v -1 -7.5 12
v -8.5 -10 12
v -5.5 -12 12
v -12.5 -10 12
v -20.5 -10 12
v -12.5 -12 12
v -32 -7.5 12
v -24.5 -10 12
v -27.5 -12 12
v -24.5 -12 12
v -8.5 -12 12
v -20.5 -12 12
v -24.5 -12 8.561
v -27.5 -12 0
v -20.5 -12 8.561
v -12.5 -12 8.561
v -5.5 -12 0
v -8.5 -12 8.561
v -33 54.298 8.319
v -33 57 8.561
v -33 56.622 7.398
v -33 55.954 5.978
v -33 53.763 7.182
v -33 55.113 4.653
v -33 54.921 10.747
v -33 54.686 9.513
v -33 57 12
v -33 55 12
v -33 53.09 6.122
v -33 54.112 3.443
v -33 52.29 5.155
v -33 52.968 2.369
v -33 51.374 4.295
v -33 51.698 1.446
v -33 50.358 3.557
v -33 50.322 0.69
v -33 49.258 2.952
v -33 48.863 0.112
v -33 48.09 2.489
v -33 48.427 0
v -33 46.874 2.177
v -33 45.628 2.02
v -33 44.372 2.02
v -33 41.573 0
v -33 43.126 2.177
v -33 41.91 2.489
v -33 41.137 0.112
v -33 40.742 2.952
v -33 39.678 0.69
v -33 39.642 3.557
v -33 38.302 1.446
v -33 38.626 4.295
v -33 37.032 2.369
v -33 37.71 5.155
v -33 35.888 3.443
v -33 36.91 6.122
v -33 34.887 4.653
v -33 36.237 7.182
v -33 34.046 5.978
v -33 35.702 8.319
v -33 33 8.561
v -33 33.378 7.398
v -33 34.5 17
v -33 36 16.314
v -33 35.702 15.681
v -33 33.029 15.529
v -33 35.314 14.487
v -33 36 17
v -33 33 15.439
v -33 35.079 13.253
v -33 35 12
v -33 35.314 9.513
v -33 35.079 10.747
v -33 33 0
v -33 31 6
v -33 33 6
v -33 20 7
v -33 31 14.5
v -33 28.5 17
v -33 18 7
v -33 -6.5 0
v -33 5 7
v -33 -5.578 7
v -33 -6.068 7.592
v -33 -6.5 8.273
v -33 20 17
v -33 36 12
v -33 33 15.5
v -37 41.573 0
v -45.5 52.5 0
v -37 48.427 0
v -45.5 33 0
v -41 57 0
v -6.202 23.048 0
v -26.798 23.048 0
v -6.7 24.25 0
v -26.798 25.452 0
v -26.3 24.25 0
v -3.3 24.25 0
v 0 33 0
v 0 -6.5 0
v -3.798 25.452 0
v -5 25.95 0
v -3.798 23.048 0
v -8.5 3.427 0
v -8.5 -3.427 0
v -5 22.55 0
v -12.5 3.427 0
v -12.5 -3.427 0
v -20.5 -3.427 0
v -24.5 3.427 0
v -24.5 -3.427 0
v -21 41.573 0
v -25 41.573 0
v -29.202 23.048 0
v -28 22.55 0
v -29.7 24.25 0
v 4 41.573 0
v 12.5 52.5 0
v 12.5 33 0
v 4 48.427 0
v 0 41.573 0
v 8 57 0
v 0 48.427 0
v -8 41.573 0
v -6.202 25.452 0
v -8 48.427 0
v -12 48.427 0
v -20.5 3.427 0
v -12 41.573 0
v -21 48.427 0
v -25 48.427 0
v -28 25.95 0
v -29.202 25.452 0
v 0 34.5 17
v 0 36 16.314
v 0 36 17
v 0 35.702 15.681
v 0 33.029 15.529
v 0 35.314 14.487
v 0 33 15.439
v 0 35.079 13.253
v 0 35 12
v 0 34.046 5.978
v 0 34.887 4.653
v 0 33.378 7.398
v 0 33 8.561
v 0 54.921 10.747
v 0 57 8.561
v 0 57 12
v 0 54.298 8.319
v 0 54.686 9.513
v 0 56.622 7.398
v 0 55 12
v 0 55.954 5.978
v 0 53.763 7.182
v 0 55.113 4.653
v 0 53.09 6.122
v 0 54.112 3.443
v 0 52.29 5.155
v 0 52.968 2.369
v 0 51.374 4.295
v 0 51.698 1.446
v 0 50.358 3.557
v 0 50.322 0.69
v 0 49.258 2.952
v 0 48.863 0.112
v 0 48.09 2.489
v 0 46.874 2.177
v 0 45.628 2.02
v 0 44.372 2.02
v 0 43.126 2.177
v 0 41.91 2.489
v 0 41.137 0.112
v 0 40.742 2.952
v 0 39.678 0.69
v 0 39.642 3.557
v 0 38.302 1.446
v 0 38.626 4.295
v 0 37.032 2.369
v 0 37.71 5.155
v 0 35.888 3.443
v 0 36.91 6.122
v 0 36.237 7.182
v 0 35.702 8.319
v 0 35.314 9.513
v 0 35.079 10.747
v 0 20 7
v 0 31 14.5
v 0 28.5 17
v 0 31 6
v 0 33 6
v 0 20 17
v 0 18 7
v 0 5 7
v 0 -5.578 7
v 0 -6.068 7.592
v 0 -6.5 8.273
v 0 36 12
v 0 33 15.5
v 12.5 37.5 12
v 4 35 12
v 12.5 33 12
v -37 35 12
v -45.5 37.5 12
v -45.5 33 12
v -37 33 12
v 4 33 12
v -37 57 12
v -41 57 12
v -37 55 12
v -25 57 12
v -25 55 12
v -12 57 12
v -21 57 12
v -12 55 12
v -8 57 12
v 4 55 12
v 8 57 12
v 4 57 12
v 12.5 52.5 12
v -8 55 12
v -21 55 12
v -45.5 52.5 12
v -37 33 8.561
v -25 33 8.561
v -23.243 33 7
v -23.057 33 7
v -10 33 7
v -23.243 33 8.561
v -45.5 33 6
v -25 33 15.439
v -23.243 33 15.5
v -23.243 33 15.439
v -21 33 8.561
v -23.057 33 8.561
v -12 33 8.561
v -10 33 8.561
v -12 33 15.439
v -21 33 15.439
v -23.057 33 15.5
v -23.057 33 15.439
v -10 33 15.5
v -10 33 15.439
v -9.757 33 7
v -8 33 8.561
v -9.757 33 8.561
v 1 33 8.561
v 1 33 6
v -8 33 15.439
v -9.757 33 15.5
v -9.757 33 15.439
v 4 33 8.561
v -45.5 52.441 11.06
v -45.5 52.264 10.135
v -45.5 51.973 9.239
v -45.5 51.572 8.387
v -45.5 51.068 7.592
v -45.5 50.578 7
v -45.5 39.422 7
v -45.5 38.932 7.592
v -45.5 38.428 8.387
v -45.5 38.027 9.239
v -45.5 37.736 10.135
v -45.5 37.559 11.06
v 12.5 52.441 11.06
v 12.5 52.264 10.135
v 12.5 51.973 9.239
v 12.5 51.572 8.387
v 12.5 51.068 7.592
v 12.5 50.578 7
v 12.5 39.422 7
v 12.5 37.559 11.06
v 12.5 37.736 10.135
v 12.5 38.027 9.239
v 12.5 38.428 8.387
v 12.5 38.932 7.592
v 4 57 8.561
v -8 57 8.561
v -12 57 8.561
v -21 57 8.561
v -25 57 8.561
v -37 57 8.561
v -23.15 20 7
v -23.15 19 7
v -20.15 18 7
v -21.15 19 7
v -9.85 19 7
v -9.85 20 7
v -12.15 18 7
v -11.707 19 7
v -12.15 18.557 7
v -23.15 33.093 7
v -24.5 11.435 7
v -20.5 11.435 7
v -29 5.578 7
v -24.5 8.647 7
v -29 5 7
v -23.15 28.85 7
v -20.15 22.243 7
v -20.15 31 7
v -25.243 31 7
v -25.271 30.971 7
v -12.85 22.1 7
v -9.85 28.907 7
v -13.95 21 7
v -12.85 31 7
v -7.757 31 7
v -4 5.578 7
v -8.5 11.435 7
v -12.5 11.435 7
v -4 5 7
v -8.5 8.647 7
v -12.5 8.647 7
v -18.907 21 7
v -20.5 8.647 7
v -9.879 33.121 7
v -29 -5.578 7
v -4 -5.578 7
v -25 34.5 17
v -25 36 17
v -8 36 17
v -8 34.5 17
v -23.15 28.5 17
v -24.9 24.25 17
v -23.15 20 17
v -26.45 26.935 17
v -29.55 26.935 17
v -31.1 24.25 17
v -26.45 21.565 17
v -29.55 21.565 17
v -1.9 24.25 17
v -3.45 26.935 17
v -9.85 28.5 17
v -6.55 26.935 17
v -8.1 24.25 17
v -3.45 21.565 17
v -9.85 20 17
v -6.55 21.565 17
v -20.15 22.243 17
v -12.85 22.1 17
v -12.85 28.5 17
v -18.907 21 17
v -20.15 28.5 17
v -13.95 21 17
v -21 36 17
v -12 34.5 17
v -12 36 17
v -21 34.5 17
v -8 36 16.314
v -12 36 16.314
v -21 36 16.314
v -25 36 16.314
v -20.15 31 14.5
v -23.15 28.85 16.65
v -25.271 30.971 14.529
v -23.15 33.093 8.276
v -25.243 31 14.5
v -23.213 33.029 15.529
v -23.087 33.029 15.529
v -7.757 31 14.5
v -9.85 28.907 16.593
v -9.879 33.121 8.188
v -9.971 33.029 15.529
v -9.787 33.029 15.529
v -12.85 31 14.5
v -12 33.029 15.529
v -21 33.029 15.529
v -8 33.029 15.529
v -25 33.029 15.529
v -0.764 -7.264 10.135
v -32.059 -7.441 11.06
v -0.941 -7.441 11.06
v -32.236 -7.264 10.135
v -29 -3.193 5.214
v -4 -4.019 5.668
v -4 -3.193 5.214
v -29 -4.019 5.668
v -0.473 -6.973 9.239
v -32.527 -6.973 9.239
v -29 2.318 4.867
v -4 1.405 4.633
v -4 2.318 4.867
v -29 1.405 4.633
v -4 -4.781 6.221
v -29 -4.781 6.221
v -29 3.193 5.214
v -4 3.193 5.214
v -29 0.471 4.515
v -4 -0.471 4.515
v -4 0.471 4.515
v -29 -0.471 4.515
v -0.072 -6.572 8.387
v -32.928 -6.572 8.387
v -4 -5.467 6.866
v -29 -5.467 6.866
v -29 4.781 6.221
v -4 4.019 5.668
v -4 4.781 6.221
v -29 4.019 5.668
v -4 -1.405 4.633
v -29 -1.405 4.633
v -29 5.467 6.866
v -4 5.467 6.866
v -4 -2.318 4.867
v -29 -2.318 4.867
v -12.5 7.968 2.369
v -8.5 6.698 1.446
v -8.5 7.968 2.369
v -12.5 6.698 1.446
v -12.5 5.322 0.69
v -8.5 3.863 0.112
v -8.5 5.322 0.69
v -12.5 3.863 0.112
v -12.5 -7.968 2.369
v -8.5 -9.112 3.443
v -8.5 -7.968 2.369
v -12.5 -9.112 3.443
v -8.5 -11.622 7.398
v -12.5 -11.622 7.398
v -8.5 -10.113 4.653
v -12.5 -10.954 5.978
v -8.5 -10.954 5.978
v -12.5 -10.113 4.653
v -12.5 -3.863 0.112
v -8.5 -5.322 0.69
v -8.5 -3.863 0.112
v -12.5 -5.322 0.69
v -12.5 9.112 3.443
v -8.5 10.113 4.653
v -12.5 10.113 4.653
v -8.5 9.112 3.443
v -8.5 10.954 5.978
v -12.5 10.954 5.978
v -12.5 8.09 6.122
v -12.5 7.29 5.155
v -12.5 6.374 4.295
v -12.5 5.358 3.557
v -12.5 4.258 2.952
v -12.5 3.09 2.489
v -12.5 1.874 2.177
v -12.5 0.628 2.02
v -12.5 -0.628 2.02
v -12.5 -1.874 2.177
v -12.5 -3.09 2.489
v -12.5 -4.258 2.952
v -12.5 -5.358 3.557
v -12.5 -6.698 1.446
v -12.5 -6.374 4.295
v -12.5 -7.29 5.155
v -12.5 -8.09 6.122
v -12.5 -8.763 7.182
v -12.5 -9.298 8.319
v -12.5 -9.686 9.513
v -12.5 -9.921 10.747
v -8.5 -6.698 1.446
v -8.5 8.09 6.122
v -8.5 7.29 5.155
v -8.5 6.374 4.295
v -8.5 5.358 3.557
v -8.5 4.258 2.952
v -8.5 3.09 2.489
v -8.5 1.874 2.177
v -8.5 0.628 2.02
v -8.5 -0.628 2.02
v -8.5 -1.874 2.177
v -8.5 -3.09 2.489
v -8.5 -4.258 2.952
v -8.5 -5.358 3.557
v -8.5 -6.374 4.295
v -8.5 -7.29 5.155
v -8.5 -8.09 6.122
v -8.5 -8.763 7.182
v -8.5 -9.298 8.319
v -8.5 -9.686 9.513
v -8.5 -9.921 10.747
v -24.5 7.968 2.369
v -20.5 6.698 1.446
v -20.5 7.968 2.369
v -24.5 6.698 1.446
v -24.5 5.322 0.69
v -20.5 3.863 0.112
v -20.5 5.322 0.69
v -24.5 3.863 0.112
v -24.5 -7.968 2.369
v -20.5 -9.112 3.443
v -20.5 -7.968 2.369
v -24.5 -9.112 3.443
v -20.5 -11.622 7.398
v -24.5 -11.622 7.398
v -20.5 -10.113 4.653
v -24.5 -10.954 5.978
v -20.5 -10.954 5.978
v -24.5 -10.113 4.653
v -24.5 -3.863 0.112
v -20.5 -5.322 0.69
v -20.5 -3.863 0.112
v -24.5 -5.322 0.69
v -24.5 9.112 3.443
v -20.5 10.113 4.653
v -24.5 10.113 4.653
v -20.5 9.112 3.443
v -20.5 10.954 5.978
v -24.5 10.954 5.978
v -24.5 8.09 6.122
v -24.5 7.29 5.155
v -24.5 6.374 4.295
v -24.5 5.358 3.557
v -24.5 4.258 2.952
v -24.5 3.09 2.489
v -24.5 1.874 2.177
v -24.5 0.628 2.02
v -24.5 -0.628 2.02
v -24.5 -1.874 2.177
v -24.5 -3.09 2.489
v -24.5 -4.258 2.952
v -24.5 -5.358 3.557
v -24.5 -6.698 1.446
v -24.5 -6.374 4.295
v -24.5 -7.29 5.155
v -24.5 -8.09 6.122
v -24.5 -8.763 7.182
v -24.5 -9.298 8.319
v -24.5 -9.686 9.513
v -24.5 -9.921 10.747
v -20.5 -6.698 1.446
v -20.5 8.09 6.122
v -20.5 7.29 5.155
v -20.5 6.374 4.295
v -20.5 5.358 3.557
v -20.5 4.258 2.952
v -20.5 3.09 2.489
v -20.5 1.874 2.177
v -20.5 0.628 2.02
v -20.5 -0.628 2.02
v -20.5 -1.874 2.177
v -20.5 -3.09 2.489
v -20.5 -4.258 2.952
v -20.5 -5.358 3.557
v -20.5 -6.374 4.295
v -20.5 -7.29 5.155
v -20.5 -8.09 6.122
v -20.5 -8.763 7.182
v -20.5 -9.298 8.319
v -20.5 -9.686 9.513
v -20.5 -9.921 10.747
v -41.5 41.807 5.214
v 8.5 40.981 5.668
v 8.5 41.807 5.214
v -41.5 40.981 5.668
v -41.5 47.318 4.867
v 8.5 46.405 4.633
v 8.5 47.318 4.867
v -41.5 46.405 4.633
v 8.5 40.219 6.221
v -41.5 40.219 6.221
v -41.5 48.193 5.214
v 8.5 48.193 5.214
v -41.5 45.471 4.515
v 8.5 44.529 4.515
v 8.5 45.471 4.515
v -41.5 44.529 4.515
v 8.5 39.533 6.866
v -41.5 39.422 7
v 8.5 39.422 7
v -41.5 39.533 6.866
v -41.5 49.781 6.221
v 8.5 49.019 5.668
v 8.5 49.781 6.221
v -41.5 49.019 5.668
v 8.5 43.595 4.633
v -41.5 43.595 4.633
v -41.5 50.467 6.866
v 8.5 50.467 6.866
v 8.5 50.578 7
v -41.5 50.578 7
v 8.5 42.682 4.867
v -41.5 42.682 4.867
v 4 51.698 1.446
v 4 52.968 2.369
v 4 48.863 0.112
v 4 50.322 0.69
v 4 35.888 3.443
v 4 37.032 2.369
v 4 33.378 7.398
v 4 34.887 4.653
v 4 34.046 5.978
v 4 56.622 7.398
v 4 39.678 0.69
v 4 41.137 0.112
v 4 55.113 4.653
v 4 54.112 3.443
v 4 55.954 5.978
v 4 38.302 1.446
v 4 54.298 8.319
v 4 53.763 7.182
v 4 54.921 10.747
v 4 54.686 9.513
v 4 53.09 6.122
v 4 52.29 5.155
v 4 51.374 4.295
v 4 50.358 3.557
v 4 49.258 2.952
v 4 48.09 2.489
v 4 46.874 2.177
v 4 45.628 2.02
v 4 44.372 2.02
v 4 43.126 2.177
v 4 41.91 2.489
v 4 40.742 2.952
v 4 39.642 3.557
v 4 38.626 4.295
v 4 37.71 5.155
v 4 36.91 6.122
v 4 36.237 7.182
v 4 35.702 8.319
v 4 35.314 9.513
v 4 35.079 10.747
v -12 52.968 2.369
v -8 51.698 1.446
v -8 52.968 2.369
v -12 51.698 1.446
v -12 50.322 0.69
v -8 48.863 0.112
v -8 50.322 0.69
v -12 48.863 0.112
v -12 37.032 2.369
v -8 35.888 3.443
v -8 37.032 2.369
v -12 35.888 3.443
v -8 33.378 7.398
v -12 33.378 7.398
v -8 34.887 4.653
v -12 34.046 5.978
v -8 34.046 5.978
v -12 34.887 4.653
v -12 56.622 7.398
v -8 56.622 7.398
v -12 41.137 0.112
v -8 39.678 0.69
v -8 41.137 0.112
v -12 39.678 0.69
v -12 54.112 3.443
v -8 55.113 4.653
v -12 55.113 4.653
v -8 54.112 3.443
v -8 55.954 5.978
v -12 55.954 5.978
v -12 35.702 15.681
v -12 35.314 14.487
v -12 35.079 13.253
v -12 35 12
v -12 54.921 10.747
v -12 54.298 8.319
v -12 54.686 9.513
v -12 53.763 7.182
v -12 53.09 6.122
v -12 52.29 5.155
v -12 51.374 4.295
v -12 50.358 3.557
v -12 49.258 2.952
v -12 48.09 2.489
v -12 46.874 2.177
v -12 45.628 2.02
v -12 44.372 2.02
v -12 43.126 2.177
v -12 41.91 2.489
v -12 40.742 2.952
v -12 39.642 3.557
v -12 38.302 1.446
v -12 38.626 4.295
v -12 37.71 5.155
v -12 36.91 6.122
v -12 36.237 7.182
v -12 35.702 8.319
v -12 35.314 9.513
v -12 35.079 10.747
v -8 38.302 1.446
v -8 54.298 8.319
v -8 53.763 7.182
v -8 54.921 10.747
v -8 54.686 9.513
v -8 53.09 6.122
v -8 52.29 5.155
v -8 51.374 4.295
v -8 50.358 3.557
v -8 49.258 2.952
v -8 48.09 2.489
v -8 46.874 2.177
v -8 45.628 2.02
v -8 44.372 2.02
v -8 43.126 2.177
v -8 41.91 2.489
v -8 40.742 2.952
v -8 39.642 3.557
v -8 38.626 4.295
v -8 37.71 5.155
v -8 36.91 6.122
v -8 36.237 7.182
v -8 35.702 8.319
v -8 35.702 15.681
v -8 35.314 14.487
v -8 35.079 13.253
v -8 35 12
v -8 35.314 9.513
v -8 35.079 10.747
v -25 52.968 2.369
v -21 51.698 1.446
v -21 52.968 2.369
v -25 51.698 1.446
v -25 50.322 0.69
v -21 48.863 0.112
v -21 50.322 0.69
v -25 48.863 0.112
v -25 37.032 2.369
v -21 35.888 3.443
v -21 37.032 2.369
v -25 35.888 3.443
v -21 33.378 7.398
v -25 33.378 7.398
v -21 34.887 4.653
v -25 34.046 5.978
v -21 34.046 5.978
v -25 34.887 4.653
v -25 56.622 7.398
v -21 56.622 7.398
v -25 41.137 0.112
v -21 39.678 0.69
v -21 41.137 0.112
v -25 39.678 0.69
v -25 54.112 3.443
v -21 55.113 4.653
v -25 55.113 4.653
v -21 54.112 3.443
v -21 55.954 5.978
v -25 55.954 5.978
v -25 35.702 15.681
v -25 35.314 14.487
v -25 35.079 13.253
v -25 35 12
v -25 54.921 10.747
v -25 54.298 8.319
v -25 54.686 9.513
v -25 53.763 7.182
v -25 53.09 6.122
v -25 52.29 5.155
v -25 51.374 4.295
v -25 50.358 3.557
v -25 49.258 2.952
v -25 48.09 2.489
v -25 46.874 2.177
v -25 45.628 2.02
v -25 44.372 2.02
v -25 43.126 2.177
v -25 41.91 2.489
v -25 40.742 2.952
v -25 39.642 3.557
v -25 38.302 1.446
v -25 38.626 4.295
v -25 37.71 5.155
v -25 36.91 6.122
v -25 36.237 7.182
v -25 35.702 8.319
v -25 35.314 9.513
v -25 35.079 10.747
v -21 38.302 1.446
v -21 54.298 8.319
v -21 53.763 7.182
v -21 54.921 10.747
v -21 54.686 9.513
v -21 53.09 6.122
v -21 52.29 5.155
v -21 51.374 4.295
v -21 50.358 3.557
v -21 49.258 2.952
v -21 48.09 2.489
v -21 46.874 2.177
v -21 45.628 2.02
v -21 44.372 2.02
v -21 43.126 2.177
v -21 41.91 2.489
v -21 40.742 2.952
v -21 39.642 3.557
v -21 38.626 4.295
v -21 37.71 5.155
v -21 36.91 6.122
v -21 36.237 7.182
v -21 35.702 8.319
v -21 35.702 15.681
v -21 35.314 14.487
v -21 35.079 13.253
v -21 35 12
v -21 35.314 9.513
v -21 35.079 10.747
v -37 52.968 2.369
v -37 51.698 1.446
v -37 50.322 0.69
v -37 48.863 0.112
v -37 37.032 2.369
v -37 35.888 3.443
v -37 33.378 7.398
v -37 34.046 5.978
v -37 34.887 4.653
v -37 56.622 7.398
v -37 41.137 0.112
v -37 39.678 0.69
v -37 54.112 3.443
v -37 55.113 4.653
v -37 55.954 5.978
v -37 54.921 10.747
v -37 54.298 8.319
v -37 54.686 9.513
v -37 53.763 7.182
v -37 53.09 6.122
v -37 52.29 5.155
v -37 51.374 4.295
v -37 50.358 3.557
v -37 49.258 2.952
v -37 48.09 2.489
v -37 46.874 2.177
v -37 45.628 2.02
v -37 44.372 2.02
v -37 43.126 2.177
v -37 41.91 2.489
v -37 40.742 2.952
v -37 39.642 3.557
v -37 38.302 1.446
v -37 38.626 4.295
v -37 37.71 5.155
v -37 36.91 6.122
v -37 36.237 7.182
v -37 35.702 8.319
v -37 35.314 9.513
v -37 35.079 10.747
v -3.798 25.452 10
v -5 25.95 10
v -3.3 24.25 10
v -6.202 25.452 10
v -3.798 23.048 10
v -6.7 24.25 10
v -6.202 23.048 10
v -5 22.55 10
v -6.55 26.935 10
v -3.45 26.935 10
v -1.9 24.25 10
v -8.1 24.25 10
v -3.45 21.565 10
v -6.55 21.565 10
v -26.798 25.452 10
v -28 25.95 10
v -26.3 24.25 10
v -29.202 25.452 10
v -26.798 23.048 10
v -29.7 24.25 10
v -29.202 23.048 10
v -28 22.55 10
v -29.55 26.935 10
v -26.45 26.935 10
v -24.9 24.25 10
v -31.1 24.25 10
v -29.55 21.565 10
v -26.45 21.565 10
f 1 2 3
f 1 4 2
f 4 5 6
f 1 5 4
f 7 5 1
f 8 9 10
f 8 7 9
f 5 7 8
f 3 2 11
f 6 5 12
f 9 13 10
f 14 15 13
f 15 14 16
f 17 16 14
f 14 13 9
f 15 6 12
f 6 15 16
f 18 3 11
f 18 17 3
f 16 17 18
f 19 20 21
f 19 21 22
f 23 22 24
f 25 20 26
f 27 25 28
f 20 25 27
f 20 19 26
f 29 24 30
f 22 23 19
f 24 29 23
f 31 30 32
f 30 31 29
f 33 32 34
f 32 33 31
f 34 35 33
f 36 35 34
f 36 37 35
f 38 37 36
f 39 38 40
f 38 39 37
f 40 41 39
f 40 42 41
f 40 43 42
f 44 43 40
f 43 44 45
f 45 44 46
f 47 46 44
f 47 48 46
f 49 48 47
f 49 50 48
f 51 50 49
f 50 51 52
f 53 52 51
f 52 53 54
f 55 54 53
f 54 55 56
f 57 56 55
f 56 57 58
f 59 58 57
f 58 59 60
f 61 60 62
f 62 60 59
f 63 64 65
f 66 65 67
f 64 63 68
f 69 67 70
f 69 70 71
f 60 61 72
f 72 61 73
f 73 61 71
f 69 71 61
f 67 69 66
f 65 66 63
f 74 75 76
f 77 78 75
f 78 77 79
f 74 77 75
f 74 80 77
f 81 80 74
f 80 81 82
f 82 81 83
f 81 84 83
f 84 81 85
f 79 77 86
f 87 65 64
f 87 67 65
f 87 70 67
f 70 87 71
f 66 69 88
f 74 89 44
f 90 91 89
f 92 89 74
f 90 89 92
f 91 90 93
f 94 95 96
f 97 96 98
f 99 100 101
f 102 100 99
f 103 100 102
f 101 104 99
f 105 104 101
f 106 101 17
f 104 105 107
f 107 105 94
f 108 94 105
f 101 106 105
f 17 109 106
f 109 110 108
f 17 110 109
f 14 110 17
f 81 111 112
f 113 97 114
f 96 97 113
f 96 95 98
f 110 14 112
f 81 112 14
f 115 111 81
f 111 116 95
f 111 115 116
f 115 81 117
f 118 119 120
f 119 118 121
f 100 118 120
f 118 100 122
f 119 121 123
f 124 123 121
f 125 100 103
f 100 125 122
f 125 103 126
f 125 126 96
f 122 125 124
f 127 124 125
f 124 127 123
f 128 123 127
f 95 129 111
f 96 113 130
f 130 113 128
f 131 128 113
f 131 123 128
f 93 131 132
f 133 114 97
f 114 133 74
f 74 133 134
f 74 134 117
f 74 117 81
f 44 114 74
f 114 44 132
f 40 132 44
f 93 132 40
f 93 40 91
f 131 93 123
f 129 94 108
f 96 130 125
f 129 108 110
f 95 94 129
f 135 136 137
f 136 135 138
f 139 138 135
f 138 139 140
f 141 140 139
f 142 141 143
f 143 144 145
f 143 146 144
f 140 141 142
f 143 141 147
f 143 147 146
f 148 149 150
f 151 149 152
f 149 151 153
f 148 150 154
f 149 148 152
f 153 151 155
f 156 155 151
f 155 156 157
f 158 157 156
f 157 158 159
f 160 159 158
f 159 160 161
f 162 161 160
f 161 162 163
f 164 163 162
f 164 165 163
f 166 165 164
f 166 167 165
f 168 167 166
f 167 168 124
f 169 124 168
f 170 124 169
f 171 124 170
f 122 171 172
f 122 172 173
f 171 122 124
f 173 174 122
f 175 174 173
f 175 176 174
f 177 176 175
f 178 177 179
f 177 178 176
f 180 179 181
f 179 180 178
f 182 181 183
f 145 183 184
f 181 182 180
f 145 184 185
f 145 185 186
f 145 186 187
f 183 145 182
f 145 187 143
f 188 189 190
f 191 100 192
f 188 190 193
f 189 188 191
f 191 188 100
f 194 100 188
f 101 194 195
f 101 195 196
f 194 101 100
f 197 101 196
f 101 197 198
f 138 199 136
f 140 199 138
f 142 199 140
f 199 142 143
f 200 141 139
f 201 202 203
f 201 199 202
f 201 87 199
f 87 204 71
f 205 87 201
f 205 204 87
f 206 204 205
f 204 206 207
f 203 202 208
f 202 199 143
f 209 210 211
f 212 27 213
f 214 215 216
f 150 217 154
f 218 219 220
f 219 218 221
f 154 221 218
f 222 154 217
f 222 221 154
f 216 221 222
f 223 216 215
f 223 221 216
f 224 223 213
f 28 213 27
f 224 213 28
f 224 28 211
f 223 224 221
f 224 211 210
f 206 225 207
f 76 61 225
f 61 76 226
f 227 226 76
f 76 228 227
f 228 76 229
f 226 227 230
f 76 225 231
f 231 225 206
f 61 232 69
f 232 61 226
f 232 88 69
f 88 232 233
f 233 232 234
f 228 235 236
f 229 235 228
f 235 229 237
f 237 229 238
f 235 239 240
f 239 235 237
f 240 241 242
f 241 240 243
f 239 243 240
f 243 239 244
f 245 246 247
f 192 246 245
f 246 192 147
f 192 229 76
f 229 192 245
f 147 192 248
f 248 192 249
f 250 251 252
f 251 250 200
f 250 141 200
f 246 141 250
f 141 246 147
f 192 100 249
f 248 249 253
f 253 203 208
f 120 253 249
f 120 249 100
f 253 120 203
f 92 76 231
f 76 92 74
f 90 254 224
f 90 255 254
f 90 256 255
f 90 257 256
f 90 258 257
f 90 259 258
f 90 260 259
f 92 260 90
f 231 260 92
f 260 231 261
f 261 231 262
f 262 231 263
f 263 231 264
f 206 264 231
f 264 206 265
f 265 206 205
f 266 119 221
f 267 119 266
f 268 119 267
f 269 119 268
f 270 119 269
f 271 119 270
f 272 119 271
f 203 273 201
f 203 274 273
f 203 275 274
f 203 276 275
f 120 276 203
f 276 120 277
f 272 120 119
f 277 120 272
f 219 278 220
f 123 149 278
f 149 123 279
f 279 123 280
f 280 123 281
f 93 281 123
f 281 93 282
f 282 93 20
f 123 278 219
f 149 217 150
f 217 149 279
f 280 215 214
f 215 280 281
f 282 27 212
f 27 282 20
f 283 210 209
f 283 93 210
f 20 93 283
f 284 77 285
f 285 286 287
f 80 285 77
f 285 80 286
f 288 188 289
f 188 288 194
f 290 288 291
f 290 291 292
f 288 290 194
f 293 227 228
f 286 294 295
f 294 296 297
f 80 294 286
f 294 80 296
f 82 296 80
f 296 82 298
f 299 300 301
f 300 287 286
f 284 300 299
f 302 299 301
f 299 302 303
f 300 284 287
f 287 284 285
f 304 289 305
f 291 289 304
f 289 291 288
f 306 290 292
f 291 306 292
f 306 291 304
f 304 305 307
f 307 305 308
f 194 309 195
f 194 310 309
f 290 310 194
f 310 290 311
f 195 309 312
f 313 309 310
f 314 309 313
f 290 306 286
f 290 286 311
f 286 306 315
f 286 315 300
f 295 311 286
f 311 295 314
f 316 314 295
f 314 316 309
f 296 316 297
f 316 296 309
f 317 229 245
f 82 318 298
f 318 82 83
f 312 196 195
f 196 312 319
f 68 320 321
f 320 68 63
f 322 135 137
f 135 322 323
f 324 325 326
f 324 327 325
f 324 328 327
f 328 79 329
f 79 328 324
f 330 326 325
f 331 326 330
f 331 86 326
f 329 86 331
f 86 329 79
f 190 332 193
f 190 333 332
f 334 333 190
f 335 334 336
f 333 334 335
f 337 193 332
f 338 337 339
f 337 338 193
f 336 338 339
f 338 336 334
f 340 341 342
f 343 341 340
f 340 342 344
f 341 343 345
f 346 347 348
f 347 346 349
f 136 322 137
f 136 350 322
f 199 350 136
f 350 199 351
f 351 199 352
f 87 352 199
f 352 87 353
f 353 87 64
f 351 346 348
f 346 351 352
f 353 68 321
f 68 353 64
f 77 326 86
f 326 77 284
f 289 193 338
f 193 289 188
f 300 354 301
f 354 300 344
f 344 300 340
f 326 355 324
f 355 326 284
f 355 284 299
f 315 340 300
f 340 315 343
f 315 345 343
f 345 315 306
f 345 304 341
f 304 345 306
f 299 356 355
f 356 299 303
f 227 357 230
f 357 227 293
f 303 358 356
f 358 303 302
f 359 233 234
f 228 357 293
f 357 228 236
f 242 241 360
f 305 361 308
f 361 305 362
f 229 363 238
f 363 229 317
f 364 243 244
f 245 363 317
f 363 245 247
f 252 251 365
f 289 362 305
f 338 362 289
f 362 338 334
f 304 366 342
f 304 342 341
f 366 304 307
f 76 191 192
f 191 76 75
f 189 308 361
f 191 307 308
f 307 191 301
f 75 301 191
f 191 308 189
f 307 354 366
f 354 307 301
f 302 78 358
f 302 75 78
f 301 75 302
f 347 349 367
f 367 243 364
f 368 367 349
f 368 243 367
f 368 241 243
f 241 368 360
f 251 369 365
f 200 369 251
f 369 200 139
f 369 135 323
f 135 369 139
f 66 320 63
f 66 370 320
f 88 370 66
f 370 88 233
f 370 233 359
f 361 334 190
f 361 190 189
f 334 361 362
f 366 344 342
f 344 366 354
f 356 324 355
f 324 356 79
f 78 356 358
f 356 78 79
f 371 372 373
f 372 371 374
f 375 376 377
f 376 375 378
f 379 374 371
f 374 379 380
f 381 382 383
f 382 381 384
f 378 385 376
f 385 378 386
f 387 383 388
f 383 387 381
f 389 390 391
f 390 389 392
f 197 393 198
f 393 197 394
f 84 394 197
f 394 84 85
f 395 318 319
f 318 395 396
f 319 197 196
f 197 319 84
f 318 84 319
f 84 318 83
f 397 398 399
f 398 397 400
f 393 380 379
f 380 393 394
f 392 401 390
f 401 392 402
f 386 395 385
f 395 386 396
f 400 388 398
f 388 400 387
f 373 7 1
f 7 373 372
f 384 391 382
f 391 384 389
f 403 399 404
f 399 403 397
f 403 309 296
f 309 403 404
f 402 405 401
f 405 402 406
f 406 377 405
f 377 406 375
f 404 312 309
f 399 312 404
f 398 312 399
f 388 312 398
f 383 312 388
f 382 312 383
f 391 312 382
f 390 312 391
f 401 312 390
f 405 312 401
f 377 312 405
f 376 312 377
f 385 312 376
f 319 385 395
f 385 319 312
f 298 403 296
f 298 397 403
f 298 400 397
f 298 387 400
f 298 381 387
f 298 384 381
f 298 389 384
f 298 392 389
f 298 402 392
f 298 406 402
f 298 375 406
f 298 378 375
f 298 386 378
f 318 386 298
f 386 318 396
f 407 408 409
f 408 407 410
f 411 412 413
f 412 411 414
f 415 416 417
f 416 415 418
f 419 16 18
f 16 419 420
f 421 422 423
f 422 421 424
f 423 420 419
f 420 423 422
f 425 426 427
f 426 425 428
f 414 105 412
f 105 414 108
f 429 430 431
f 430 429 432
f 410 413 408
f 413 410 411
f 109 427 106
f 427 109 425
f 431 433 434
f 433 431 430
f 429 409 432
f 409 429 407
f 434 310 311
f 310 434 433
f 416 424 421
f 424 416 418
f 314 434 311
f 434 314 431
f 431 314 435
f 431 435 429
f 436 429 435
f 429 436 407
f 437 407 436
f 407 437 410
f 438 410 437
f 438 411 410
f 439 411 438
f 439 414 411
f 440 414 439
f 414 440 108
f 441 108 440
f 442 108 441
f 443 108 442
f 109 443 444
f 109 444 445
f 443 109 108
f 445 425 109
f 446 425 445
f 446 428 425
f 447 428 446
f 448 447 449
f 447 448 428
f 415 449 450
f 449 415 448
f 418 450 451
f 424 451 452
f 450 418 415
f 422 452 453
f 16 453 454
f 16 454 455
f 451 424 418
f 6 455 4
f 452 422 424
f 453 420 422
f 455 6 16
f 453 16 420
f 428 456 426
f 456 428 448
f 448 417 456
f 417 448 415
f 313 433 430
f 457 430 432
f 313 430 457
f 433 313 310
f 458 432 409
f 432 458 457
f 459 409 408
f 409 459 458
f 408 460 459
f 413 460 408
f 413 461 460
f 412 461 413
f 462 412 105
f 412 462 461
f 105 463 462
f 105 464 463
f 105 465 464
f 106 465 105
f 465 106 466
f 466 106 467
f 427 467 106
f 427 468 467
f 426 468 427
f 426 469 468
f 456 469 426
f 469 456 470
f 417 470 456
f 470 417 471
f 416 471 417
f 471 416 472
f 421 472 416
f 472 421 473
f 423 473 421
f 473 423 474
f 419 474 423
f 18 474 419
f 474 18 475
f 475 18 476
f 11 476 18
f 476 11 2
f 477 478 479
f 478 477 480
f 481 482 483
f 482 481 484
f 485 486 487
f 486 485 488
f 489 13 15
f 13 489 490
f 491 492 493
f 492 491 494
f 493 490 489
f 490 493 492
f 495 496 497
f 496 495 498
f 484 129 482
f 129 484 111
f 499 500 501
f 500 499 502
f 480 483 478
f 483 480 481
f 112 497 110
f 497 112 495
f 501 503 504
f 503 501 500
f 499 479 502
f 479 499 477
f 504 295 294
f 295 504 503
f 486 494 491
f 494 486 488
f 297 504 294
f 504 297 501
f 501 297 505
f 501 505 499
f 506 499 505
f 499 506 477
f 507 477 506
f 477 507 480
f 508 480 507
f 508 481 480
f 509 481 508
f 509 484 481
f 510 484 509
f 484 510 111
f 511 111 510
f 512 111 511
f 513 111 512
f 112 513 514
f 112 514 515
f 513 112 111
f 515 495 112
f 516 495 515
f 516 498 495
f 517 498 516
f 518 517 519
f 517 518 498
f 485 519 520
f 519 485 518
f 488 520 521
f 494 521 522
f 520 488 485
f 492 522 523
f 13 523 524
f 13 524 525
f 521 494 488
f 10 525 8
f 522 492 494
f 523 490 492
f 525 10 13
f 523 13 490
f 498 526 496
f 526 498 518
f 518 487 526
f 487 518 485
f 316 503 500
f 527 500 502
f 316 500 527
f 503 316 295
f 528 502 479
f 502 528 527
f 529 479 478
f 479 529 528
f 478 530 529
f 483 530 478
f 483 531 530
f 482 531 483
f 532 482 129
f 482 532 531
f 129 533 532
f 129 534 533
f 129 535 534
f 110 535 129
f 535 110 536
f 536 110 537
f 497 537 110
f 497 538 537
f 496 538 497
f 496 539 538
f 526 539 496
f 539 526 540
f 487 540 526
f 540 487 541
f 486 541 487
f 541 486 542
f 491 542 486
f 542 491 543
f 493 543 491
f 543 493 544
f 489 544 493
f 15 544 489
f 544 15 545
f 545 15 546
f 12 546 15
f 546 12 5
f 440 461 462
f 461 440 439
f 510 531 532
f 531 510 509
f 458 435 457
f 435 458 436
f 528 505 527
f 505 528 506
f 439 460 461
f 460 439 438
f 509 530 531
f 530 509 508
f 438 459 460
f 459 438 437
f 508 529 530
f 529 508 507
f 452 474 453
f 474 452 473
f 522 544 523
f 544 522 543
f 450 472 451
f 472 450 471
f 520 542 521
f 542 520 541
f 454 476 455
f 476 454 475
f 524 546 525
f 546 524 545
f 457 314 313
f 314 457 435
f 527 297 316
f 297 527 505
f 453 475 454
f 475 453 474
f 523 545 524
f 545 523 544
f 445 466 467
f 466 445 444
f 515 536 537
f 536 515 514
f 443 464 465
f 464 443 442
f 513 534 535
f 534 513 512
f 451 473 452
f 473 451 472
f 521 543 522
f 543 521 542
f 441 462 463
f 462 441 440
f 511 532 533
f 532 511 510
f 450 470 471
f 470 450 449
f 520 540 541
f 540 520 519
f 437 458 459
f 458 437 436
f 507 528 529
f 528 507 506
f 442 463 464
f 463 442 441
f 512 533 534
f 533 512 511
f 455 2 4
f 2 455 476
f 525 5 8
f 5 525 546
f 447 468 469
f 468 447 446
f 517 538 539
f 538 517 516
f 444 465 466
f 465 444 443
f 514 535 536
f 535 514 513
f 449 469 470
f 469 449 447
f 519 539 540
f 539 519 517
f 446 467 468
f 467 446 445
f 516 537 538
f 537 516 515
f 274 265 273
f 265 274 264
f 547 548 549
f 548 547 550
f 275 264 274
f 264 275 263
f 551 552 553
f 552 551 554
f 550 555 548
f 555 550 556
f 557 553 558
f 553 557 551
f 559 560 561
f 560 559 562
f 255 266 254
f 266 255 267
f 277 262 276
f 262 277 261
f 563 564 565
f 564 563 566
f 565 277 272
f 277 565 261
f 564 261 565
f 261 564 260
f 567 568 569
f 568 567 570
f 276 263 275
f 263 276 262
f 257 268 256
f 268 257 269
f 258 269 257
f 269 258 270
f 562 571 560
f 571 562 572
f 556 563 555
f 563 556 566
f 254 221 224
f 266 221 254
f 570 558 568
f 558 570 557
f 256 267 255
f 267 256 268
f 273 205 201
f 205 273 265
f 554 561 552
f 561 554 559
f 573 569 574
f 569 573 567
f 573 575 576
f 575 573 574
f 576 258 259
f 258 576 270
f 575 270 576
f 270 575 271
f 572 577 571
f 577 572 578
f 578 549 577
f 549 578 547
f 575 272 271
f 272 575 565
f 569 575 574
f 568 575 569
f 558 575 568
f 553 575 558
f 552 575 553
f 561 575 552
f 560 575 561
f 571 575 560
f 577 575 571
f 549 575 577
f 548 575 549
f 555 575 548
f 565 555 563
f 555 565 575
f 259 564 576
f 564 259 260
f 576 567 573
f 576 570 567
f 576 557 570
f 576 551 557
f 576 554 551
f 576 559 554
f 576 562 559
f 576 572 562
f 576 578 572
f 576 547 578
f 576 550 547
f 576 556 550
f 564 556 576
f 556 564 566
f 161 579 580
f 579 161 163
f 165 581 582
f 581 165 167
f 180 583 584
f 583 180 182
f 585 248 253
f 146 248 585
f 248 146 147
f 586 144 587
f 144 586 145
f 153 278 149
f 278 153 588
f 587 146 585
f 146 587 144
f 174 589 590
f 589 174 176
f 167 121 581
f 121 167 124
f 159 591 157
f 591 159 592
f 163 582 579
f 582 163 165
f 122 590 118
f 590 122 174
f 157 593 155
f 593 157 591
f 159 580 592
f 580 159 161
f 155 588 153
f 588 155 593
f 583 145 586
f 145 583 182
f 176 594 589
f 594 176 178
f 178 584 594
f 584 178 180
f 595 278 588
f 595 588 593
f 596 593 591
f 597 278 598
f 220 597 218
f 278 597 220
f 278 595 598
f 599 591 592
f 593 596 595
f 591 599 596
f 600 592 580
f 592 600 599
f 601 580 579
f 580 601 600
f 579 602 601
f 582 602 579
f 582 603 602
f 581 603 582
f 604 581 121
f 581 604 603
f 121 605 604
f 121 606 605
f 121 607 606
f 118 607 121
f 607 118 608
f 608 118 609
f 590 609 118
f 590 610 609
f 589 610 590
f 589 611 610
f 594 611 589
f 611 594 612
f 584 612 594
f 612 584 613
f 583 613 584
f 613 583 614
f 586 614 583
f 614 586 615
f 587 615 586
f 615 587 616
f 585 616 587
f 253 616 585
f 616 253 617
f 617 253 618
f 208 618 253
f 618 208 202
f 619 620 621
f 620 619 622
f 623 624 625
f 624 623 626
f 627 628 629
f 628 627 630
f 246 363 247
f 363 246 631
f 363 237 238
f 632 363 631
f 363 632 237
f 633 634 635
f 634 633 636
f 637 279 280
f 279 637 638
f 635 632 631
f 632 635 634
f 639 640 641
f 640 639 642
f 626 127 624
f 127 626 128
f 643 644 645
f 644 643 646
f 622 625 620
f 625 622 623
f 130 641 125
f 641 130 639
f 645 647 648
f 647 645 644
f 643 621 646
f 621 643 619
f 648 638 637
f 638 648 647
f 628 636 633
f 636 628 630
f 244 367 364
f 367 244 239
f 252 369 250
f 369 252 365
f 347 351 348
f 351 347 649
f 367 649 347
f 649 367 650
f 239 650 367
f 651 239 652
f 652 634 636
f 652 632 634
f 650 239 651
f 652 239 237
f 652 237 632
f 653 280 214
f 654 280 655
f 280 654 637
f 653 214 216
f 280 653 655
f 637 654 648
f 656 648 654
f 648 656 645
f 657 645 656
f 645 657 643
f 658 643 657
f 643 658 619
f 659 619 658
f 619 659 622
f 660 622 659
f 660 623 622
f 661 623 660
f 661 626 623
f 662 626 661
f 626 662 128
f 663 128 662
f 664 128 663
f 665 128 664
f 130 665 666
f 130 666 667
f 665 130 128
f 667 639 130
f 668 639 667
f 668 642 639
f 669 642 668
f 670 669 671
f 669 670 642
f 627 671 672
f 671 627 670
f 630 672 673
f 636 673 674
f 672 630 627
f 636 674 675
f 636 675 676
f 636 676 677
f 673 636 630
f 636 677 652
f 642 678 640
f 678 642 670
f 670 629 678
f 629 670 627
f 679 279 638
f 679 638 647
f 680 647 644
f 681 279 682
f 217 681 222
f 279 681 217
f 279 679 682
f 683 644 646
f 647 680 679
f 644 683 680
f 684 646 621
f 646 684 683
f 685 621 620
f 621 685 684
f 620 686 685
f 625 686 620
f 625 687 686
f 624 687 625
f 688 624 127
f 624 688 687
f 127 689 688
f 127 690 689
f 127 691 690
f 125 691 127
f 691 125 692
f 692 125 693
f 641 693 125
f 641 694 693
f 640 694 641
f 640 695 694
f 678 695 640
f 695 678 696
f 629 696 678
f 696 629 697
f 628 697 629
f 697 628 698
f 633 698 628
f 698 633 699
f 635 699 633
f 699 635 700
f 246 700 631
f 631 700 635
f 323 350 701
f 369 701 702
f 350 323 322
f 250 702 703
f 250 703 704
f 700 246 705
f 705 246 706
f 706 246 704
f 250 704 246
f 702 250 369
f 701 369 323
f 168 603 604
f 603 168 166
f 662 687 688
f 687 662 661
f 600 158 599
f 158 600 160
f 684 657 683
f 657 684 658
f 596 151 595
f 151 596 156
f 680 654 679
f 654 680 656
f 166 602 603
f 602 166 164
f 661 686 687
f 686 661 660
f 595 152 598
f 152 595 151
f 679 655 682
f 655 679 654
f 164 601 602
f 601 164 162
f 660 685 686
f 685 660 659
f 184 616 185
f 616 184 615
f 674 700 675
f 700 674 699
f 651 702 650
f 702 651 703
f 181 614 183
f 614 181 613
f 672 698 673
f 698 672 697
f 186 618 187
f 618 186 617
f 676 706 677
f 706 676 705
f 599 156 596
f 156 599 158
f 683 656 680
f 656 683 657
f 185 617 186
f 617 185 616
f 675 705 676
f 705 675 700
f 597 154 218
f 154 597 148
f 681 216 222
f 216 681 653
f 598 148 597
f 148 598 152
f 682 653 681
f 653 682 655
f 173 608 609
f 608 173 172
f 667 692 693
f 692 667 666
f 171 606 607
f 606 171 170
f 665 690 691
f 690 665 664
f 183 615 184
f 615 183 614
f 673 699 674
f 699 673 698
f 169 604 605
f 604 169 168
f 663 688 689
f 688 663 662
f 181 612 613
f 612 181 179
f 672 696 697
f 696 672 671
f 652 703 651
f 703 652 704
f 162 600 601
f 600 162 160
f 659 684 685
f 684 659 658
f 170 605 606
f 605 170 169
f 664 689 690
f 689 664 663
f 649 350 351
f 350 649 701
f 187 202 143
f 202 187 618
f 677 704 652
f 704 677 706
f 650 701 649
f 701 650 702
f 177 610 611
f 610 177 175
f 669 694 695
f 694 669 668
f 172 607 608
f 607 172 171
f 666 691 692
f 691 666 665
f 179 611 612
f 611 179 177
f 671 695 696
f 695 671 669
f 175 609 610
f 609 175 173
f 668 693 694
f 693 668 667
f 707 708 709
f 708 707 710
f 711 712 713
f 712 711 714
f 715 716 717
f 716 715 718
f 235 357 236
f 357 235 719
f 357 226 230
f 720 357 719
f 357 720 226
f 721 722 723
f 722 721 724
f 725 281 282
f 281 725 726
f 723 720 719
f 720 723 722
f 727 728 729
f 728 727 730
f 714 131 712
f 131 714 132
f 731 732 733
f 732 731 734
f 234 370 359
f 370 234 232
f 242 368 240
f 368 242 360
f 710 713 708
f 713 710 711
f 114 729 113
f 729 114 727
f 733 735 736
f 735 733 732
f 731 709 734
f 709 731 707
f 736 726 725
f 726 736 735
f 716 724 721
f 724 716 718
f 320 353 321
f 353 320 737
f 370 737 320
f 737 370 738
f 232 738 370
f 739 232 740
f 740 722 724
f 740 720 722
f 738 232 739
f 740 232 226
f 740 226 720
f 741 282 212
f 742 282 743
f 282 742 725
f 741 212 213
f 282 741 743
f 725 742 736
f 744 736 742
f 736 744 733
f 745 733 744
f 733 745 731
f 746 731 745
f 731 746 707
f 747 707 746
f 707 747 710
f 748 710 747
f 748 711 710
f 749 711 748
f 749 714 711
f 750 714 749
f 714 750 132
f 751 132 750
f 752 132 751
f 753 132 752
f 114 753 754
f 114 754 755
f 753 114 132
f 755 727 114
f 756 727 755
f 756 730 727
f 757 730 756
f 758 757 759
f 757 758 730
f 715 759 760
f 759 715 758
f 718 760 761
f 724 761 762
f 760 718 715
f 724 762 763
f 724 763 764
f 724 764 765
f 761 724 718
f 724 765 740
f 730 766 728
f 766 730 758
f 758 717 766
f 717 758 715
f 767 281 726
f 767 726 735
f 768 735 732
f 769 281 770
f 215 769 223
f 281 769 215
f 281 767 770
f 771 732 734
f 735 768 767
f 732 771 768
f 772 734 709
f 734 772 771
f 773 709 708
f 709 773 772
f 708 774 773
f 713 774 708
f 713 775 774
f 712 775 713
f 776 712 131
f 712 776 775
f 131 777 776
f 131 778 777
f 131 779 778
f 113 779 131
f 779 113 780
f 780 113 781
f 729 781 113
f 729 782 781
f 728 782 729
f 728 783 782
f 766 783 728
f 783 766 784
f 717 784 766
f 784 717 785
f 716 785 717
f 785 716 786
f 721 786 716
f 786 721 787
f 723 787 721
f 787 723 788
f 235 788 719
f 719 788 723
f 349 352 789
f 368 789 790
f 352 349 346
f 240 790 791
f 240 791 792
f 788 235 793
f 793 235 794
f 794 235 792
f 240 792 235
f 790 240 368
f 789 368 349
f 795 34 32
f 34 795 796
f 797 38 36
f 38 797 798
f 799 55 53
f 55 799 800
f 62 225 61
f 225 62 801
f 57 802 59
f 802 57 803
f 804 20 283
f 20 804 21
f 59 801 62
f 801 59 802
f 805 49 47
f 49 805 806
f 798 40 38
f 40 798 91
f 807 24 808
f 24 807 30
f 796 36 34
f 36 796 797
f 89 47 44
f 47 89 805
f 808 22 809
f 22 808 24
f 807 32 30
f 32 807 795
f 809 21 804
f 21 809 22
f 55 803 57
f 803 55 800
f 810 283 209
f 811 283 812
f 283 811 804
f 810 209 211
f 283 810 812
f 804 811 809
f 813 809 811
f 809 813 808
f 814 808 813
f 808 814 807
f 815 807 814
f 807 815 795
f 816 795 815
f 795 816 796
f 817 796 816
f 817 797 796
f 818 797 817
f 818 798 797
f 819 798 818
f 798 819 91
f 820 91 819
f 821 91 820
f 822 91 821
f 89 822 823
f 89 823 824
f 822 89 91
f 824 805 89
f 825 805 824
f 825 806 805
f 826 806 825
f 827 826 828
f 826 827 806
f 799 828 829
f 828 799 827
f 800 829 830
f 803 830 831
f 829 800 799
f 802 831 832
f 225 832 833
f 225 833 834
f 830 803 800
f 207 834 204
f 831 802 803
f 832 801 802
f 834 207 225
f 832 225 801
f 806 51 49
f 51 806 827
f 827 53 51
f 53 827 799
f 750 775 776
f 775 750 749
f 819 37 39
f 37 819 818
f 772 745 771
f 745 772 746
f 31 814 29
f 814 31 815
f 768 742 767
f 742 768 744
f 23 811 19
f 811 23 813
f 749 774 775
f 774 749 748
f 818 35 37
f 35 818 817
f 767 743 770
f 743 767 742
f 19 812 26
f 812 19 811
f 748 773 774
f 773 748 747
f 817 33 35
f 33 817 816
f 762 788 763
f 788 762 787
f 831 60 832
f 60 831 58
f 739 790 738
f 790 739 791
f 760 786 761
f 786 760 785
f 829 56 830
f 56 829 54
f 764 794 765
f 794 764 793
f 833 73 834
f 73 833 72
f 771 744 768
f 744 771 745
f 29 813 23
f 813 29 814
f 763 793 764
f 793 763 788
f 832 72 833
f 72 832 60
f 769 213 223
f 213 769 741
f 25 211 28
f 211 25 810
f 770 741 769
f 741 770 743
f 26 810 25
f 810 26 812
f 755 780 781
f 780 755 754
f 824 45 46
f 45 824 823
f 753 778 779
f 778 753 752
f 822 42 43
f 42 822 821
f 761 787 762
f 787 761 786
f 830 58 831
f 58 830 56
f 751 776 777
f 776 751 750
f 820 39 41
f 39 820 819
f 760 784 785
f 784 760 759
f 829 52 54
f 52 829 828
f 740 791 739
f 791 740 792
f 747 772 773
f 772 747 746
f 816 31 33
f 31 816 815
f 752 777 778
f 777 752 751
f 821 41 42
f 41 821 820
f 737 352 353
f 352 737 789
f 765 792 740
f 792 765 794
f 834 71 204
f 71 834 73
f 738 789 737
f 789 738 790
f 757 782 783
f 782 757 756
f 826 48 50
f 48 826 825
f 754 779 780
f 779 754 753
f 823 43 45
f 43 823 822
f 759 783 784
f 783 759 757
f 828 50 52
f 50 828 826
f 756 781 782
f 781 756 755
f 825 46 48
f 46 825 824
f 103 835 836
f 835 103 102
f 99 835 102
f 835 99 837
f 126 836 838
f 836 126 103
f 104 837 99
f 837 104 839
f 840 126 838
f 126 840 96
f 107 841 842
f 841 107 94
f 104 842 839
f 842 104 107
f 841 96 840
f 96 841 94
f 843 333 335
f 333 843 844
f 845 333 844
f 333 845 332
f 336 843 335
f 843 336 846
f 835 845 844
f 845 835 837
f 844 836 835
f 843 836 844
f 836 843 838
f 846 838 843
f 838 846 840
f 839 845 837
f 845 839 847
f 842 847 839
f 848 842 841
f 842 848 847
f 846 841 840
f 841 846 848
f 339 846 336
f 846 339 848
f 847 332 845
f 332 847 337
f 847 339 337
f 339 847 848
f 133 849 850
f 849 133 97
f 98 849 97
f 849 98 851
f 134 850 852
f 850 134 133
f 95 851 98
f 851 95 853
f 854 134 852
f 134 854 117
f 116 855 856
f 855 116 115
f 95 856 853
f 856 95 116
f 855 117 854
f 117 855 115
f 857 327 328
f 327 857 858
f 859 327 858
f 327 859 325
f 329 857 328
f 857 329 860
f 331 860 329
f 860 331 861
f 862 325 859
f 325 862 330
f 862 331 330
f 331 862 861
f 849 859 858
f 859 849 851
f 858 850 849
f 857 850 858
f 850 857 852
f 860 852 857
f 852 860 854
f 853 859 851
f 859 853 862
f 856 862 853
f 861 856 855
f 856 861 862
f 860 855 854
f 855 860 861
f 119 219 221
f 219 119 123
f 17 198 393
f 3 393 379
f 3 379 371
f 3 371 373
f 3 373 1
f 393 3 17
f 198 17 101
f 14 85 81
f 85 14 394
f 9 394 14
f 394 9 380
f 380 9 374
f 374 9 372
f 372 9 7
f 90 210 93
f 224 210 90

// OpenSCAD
// file: bearing.scad
// PRUSA iteration3
// Bearing holders
// GNU GPL v3
// Josef Průša <iam@josefprusa.cz> and contributors
// http://www.reprap.org/wiki/Prusa_Mendel
// http://prusamendel.org

bearing_diameter = 15;
thinwall = 3;
bearing_size = bearing_diameter + 2 * thinwall;
tolerance = 0.15;
bearing_height = 52;

module horizontal_bearing_base(bearings=1) {
  translate(v=[0,0,6]) cube(size = [24,8+bearings*25,12], center = true);
}

module horizontal_bearing_holes(bearings=1) {
  cutter_lenght = 10+bearings*25;
  one_holder_lenght = 8+25;
  holder_lenght = 8+bearings*25;

  // Main bearing cut
  difference() {
    translate(v = [0,0,12]) rotate(a = [90,0,0]) translate(v = [0,0,-cutter_lenght/2]) cylinder(h = cutter_lenght, r = bearing_diameter/2, $fn = 50);
    // Bearing retainers
    translate(v=[0,1-holder_lenght/2,3]) cube(size = [24,6,8], center = true);
    translate(v=[0,-1+holder_lenght/2,3]) cube(size = [24,6,8], center = true);
  }

  // Ziptie cutouts
  ziptie_cut_ofset = 0;

  for (i = [0:bearings-1]) {
    // For easier positioning I move them by half of one
    // bearing holder then add each bearign lenght and then center again
    translate(v = [0,-holder_lenght/2,0]) translate(v = [0,one_holder_lenght/2+i*25,0]) difference(){
      union(){
        translate(v = [0,2-6,12]) rotate(a = [90,0,0]) translate(v = [0,0,0]) cylinder(h = 4, r = 12.5, $fn = 50);
        translate(v = [0,2+6,12]) rotate(a = [90,0,0]) translate(v = [0,0,0]) cylinder(h = 4, r = 12.5, $fn = 50);
      }
      translate(v = [0,10,12]) rotate(a = [90,0,0]) translate(v = [0,0,0]) cylinder(h = 24, r = 10, $fn = 50);
    }
  }
}

module horizontal_bearing_test() {
  difference(){
    horizontal_bearing_base(1);
    horizontal_bearing_holes(1);
  }
  translate(v=[30,0,0]) difference(){
    horizontal_bearing_base(2);
    horizontal_bearing_holes(2);
  }
  translate(v=[60,0,0]) difference(){
    horizontal_bearing_base(3);
    horizontal_bearing_holes(3);
  }
}



module vertical_bearing_base(height) {
  translate(v = [-bearing_size/2-3,bearing_size/2-1,height-2.5]) cube(size = [17,2,5], center = true);
  difference(){
  translate(v = [-2-bearing_size/4,0,height/2]) cube(size = [bearing_size/2-2,bearing_size,height], center = true);
  //cylinder(h = height, r=bearing_size/2, $fn = 90);
    //nice edge
   translate (v = [2.2-bearing_size/4,-bearing_size/2,height/2]) rotate ([0,0,45]) cube(size=[2,2,60],center=true);
   translate (v = [2.2-bearing_size/4,bearing_size/2,height/2]) rotate ([0,0,45]) cube(size=[2,2,60],center=true);  //translate(v = [-2-bearing_size/4,0,height/2]) 
  }    
}

module vertical_bearing_holes(height) {
  
  translate(v = [0,0,2]) cylinder(h = height+tolerance*2, r = bearing_diameter/2+tolerance, $fn = 60);
    //translate(v = [-bearing_diameter/2,0,height/2]) cube([4,bearing_diameter+2,10], center = true);
   translate(v = [0,0,-2]) cylinder(h = height*2, r = bearing_diameter/2-2, $fn = 60);
  
}

difference() {
  vertical_bearing_base(bearing_height);
  vertical_bearing_holes(bearing_height-3.70);
    
 }
translate(v = [-2-bearing_size/4,0,bearing_height-2]) cube(size = [bearing_size/2-2,bearing_size/2,tolerance*2], center = true) ;
//vertical_bearing_holes(50);
// main file
// PRUSA iteration3
// X carriage
// GNU GPL v3
// Modified version by Sam Sheffield <hello@samsheffield.com>
// Original design by Josef Průša <iam@josefprusa.cz> and contributors
// http://www.reprap.org/wiki/Prusa_Mendel
// http://prusamendel.org

use <bearing.scad>

module x_carriage_base(){
 // Small bearing holder
 translate([-33/2,0,0]) rotate([0,0,90]) horizontal_bearing_base(1);
 // Long bearing holder
 translate([-33/2,45,0]) rotate([0,0,90]) horizontal_bearing_base(2);
 // Base plate
 translate([-33,-11.5,0]) cube([33,68,7]);
 // Belt holder base
 translate([-33,20,0]) cube([33,16,17]);
}

module x_carriage_beltcut(){
 // Cut in the middle for belt
 translate([-2.5-16.5+1,19,7]) cube([4.5,13,15]);
 // Cut clearing space for the belt
 translate([-38,5,7]) cube([40,13,15]);
 // Belt slit
 translate([-66,21.5+10,6]) cube([67,1,15]);
 // Smooth entrance
 translate([-66,21.5+10,14]) rotate([45,0,0]) cube([67,15,15]);
 // Teeth cuts
 for ( i = [0 : 23] ){
  translate([0-i*3,21.5+8,6]) cube([1.7,3,15]);
 }
}

module x_carriage_labyrinth(){
 // Cut the labyrinth for the belt
 translate([-7.65-16.5+1,19,7]) cube([3,13,15]);
 translate([-4.65-16.5+1,18,7]) rotate([0, 0, 45]) cube([3,3,15]);
 translate([-4.65-16.5+1,18,7]) cube([8,3,15]);
 translate([.55-16.5+1,20,7]) rotate([0, 0, -45]) cube([3,3,15]);

 translate([-7.65-16.5+1,28.85,7]) rotate([0, 0, 45]) cube([3,3,15]);
 translate([3.5-16.5+1,31,7]) rotate([0, 0, -45]) cube([3,3,15]);
 translate([2.65-16.5+1,19,7]) cube([3,13,15]);
 // Cut clearing space for the belt
 translate([-38,5,7]) cube([40,13,15]);
 // Belt slit
 translate([-66,21.5+9.5,6]) cube([67,2,15]);
 // Smooth entrance
 translate([-66,21.5+10,14]) rotate([45,0,0]) cube([67,15,15]);

}

module x_carriage_holes(){
 // Small bearing holder holes cutter
 translate([-33/2,0,0]) rotate([0,0,90]) horizontal_bearing_holes(1);
 // Long bearing holder holes cutter
 translate([-33/2,45,0]) rotate([0,0,90]) horizontal_bearing_holes(2);
  // Extruder mounting holes
  translate([-16.5+11.5,24.25,-1])cylinder(r=1.7, h=20, $fn=8);
  translate([-16.5+11.5,24.25,10])cylinder(r=3.1, h=20, $fn=6); 
  translate([-16.5-11.5,24.25,-1])cylinder(r=1.7, h=20, $fn=8);
  translate([-16.5-11.5,24.25,10])cylinder(r=3.1, h=20, $fn=6); 	
}

module x_carriage_fancy(){
 // Top right corner
 translate([13.5,-5,0]) translate([0,45+11.5,-1]) rotate([0,0,45]) translate([0,-15,0]) cube([30,30,20]);
 // Bottom right corner
 translate([0,5,0]) translate([0,-11.5,-1]) rotate([0,0,-45]) translate([0,-15,0]) cube([30,30,20]);
 // Bottom ĺeft corner
 translate([-33,5,0]) translate([0,-11.5,-1]) rotate([0,0,-135]) translate([0,-15,0]) cube([30,30,20]);
 // Top left corner
 translate([-33-13.5,-5,0]) translate([0,45+11.5,-1]) rotate([0,0,135]) translate([0,-15,0]) cube([30,30,20]);	
}

// Final part
module x_carriage(){
 difference(){
  x_carriage_base();
  x_carriage_labyrinth();
  x_carriage_holes();
  x_carriage_fancy();
 }
}

x_carriage();
